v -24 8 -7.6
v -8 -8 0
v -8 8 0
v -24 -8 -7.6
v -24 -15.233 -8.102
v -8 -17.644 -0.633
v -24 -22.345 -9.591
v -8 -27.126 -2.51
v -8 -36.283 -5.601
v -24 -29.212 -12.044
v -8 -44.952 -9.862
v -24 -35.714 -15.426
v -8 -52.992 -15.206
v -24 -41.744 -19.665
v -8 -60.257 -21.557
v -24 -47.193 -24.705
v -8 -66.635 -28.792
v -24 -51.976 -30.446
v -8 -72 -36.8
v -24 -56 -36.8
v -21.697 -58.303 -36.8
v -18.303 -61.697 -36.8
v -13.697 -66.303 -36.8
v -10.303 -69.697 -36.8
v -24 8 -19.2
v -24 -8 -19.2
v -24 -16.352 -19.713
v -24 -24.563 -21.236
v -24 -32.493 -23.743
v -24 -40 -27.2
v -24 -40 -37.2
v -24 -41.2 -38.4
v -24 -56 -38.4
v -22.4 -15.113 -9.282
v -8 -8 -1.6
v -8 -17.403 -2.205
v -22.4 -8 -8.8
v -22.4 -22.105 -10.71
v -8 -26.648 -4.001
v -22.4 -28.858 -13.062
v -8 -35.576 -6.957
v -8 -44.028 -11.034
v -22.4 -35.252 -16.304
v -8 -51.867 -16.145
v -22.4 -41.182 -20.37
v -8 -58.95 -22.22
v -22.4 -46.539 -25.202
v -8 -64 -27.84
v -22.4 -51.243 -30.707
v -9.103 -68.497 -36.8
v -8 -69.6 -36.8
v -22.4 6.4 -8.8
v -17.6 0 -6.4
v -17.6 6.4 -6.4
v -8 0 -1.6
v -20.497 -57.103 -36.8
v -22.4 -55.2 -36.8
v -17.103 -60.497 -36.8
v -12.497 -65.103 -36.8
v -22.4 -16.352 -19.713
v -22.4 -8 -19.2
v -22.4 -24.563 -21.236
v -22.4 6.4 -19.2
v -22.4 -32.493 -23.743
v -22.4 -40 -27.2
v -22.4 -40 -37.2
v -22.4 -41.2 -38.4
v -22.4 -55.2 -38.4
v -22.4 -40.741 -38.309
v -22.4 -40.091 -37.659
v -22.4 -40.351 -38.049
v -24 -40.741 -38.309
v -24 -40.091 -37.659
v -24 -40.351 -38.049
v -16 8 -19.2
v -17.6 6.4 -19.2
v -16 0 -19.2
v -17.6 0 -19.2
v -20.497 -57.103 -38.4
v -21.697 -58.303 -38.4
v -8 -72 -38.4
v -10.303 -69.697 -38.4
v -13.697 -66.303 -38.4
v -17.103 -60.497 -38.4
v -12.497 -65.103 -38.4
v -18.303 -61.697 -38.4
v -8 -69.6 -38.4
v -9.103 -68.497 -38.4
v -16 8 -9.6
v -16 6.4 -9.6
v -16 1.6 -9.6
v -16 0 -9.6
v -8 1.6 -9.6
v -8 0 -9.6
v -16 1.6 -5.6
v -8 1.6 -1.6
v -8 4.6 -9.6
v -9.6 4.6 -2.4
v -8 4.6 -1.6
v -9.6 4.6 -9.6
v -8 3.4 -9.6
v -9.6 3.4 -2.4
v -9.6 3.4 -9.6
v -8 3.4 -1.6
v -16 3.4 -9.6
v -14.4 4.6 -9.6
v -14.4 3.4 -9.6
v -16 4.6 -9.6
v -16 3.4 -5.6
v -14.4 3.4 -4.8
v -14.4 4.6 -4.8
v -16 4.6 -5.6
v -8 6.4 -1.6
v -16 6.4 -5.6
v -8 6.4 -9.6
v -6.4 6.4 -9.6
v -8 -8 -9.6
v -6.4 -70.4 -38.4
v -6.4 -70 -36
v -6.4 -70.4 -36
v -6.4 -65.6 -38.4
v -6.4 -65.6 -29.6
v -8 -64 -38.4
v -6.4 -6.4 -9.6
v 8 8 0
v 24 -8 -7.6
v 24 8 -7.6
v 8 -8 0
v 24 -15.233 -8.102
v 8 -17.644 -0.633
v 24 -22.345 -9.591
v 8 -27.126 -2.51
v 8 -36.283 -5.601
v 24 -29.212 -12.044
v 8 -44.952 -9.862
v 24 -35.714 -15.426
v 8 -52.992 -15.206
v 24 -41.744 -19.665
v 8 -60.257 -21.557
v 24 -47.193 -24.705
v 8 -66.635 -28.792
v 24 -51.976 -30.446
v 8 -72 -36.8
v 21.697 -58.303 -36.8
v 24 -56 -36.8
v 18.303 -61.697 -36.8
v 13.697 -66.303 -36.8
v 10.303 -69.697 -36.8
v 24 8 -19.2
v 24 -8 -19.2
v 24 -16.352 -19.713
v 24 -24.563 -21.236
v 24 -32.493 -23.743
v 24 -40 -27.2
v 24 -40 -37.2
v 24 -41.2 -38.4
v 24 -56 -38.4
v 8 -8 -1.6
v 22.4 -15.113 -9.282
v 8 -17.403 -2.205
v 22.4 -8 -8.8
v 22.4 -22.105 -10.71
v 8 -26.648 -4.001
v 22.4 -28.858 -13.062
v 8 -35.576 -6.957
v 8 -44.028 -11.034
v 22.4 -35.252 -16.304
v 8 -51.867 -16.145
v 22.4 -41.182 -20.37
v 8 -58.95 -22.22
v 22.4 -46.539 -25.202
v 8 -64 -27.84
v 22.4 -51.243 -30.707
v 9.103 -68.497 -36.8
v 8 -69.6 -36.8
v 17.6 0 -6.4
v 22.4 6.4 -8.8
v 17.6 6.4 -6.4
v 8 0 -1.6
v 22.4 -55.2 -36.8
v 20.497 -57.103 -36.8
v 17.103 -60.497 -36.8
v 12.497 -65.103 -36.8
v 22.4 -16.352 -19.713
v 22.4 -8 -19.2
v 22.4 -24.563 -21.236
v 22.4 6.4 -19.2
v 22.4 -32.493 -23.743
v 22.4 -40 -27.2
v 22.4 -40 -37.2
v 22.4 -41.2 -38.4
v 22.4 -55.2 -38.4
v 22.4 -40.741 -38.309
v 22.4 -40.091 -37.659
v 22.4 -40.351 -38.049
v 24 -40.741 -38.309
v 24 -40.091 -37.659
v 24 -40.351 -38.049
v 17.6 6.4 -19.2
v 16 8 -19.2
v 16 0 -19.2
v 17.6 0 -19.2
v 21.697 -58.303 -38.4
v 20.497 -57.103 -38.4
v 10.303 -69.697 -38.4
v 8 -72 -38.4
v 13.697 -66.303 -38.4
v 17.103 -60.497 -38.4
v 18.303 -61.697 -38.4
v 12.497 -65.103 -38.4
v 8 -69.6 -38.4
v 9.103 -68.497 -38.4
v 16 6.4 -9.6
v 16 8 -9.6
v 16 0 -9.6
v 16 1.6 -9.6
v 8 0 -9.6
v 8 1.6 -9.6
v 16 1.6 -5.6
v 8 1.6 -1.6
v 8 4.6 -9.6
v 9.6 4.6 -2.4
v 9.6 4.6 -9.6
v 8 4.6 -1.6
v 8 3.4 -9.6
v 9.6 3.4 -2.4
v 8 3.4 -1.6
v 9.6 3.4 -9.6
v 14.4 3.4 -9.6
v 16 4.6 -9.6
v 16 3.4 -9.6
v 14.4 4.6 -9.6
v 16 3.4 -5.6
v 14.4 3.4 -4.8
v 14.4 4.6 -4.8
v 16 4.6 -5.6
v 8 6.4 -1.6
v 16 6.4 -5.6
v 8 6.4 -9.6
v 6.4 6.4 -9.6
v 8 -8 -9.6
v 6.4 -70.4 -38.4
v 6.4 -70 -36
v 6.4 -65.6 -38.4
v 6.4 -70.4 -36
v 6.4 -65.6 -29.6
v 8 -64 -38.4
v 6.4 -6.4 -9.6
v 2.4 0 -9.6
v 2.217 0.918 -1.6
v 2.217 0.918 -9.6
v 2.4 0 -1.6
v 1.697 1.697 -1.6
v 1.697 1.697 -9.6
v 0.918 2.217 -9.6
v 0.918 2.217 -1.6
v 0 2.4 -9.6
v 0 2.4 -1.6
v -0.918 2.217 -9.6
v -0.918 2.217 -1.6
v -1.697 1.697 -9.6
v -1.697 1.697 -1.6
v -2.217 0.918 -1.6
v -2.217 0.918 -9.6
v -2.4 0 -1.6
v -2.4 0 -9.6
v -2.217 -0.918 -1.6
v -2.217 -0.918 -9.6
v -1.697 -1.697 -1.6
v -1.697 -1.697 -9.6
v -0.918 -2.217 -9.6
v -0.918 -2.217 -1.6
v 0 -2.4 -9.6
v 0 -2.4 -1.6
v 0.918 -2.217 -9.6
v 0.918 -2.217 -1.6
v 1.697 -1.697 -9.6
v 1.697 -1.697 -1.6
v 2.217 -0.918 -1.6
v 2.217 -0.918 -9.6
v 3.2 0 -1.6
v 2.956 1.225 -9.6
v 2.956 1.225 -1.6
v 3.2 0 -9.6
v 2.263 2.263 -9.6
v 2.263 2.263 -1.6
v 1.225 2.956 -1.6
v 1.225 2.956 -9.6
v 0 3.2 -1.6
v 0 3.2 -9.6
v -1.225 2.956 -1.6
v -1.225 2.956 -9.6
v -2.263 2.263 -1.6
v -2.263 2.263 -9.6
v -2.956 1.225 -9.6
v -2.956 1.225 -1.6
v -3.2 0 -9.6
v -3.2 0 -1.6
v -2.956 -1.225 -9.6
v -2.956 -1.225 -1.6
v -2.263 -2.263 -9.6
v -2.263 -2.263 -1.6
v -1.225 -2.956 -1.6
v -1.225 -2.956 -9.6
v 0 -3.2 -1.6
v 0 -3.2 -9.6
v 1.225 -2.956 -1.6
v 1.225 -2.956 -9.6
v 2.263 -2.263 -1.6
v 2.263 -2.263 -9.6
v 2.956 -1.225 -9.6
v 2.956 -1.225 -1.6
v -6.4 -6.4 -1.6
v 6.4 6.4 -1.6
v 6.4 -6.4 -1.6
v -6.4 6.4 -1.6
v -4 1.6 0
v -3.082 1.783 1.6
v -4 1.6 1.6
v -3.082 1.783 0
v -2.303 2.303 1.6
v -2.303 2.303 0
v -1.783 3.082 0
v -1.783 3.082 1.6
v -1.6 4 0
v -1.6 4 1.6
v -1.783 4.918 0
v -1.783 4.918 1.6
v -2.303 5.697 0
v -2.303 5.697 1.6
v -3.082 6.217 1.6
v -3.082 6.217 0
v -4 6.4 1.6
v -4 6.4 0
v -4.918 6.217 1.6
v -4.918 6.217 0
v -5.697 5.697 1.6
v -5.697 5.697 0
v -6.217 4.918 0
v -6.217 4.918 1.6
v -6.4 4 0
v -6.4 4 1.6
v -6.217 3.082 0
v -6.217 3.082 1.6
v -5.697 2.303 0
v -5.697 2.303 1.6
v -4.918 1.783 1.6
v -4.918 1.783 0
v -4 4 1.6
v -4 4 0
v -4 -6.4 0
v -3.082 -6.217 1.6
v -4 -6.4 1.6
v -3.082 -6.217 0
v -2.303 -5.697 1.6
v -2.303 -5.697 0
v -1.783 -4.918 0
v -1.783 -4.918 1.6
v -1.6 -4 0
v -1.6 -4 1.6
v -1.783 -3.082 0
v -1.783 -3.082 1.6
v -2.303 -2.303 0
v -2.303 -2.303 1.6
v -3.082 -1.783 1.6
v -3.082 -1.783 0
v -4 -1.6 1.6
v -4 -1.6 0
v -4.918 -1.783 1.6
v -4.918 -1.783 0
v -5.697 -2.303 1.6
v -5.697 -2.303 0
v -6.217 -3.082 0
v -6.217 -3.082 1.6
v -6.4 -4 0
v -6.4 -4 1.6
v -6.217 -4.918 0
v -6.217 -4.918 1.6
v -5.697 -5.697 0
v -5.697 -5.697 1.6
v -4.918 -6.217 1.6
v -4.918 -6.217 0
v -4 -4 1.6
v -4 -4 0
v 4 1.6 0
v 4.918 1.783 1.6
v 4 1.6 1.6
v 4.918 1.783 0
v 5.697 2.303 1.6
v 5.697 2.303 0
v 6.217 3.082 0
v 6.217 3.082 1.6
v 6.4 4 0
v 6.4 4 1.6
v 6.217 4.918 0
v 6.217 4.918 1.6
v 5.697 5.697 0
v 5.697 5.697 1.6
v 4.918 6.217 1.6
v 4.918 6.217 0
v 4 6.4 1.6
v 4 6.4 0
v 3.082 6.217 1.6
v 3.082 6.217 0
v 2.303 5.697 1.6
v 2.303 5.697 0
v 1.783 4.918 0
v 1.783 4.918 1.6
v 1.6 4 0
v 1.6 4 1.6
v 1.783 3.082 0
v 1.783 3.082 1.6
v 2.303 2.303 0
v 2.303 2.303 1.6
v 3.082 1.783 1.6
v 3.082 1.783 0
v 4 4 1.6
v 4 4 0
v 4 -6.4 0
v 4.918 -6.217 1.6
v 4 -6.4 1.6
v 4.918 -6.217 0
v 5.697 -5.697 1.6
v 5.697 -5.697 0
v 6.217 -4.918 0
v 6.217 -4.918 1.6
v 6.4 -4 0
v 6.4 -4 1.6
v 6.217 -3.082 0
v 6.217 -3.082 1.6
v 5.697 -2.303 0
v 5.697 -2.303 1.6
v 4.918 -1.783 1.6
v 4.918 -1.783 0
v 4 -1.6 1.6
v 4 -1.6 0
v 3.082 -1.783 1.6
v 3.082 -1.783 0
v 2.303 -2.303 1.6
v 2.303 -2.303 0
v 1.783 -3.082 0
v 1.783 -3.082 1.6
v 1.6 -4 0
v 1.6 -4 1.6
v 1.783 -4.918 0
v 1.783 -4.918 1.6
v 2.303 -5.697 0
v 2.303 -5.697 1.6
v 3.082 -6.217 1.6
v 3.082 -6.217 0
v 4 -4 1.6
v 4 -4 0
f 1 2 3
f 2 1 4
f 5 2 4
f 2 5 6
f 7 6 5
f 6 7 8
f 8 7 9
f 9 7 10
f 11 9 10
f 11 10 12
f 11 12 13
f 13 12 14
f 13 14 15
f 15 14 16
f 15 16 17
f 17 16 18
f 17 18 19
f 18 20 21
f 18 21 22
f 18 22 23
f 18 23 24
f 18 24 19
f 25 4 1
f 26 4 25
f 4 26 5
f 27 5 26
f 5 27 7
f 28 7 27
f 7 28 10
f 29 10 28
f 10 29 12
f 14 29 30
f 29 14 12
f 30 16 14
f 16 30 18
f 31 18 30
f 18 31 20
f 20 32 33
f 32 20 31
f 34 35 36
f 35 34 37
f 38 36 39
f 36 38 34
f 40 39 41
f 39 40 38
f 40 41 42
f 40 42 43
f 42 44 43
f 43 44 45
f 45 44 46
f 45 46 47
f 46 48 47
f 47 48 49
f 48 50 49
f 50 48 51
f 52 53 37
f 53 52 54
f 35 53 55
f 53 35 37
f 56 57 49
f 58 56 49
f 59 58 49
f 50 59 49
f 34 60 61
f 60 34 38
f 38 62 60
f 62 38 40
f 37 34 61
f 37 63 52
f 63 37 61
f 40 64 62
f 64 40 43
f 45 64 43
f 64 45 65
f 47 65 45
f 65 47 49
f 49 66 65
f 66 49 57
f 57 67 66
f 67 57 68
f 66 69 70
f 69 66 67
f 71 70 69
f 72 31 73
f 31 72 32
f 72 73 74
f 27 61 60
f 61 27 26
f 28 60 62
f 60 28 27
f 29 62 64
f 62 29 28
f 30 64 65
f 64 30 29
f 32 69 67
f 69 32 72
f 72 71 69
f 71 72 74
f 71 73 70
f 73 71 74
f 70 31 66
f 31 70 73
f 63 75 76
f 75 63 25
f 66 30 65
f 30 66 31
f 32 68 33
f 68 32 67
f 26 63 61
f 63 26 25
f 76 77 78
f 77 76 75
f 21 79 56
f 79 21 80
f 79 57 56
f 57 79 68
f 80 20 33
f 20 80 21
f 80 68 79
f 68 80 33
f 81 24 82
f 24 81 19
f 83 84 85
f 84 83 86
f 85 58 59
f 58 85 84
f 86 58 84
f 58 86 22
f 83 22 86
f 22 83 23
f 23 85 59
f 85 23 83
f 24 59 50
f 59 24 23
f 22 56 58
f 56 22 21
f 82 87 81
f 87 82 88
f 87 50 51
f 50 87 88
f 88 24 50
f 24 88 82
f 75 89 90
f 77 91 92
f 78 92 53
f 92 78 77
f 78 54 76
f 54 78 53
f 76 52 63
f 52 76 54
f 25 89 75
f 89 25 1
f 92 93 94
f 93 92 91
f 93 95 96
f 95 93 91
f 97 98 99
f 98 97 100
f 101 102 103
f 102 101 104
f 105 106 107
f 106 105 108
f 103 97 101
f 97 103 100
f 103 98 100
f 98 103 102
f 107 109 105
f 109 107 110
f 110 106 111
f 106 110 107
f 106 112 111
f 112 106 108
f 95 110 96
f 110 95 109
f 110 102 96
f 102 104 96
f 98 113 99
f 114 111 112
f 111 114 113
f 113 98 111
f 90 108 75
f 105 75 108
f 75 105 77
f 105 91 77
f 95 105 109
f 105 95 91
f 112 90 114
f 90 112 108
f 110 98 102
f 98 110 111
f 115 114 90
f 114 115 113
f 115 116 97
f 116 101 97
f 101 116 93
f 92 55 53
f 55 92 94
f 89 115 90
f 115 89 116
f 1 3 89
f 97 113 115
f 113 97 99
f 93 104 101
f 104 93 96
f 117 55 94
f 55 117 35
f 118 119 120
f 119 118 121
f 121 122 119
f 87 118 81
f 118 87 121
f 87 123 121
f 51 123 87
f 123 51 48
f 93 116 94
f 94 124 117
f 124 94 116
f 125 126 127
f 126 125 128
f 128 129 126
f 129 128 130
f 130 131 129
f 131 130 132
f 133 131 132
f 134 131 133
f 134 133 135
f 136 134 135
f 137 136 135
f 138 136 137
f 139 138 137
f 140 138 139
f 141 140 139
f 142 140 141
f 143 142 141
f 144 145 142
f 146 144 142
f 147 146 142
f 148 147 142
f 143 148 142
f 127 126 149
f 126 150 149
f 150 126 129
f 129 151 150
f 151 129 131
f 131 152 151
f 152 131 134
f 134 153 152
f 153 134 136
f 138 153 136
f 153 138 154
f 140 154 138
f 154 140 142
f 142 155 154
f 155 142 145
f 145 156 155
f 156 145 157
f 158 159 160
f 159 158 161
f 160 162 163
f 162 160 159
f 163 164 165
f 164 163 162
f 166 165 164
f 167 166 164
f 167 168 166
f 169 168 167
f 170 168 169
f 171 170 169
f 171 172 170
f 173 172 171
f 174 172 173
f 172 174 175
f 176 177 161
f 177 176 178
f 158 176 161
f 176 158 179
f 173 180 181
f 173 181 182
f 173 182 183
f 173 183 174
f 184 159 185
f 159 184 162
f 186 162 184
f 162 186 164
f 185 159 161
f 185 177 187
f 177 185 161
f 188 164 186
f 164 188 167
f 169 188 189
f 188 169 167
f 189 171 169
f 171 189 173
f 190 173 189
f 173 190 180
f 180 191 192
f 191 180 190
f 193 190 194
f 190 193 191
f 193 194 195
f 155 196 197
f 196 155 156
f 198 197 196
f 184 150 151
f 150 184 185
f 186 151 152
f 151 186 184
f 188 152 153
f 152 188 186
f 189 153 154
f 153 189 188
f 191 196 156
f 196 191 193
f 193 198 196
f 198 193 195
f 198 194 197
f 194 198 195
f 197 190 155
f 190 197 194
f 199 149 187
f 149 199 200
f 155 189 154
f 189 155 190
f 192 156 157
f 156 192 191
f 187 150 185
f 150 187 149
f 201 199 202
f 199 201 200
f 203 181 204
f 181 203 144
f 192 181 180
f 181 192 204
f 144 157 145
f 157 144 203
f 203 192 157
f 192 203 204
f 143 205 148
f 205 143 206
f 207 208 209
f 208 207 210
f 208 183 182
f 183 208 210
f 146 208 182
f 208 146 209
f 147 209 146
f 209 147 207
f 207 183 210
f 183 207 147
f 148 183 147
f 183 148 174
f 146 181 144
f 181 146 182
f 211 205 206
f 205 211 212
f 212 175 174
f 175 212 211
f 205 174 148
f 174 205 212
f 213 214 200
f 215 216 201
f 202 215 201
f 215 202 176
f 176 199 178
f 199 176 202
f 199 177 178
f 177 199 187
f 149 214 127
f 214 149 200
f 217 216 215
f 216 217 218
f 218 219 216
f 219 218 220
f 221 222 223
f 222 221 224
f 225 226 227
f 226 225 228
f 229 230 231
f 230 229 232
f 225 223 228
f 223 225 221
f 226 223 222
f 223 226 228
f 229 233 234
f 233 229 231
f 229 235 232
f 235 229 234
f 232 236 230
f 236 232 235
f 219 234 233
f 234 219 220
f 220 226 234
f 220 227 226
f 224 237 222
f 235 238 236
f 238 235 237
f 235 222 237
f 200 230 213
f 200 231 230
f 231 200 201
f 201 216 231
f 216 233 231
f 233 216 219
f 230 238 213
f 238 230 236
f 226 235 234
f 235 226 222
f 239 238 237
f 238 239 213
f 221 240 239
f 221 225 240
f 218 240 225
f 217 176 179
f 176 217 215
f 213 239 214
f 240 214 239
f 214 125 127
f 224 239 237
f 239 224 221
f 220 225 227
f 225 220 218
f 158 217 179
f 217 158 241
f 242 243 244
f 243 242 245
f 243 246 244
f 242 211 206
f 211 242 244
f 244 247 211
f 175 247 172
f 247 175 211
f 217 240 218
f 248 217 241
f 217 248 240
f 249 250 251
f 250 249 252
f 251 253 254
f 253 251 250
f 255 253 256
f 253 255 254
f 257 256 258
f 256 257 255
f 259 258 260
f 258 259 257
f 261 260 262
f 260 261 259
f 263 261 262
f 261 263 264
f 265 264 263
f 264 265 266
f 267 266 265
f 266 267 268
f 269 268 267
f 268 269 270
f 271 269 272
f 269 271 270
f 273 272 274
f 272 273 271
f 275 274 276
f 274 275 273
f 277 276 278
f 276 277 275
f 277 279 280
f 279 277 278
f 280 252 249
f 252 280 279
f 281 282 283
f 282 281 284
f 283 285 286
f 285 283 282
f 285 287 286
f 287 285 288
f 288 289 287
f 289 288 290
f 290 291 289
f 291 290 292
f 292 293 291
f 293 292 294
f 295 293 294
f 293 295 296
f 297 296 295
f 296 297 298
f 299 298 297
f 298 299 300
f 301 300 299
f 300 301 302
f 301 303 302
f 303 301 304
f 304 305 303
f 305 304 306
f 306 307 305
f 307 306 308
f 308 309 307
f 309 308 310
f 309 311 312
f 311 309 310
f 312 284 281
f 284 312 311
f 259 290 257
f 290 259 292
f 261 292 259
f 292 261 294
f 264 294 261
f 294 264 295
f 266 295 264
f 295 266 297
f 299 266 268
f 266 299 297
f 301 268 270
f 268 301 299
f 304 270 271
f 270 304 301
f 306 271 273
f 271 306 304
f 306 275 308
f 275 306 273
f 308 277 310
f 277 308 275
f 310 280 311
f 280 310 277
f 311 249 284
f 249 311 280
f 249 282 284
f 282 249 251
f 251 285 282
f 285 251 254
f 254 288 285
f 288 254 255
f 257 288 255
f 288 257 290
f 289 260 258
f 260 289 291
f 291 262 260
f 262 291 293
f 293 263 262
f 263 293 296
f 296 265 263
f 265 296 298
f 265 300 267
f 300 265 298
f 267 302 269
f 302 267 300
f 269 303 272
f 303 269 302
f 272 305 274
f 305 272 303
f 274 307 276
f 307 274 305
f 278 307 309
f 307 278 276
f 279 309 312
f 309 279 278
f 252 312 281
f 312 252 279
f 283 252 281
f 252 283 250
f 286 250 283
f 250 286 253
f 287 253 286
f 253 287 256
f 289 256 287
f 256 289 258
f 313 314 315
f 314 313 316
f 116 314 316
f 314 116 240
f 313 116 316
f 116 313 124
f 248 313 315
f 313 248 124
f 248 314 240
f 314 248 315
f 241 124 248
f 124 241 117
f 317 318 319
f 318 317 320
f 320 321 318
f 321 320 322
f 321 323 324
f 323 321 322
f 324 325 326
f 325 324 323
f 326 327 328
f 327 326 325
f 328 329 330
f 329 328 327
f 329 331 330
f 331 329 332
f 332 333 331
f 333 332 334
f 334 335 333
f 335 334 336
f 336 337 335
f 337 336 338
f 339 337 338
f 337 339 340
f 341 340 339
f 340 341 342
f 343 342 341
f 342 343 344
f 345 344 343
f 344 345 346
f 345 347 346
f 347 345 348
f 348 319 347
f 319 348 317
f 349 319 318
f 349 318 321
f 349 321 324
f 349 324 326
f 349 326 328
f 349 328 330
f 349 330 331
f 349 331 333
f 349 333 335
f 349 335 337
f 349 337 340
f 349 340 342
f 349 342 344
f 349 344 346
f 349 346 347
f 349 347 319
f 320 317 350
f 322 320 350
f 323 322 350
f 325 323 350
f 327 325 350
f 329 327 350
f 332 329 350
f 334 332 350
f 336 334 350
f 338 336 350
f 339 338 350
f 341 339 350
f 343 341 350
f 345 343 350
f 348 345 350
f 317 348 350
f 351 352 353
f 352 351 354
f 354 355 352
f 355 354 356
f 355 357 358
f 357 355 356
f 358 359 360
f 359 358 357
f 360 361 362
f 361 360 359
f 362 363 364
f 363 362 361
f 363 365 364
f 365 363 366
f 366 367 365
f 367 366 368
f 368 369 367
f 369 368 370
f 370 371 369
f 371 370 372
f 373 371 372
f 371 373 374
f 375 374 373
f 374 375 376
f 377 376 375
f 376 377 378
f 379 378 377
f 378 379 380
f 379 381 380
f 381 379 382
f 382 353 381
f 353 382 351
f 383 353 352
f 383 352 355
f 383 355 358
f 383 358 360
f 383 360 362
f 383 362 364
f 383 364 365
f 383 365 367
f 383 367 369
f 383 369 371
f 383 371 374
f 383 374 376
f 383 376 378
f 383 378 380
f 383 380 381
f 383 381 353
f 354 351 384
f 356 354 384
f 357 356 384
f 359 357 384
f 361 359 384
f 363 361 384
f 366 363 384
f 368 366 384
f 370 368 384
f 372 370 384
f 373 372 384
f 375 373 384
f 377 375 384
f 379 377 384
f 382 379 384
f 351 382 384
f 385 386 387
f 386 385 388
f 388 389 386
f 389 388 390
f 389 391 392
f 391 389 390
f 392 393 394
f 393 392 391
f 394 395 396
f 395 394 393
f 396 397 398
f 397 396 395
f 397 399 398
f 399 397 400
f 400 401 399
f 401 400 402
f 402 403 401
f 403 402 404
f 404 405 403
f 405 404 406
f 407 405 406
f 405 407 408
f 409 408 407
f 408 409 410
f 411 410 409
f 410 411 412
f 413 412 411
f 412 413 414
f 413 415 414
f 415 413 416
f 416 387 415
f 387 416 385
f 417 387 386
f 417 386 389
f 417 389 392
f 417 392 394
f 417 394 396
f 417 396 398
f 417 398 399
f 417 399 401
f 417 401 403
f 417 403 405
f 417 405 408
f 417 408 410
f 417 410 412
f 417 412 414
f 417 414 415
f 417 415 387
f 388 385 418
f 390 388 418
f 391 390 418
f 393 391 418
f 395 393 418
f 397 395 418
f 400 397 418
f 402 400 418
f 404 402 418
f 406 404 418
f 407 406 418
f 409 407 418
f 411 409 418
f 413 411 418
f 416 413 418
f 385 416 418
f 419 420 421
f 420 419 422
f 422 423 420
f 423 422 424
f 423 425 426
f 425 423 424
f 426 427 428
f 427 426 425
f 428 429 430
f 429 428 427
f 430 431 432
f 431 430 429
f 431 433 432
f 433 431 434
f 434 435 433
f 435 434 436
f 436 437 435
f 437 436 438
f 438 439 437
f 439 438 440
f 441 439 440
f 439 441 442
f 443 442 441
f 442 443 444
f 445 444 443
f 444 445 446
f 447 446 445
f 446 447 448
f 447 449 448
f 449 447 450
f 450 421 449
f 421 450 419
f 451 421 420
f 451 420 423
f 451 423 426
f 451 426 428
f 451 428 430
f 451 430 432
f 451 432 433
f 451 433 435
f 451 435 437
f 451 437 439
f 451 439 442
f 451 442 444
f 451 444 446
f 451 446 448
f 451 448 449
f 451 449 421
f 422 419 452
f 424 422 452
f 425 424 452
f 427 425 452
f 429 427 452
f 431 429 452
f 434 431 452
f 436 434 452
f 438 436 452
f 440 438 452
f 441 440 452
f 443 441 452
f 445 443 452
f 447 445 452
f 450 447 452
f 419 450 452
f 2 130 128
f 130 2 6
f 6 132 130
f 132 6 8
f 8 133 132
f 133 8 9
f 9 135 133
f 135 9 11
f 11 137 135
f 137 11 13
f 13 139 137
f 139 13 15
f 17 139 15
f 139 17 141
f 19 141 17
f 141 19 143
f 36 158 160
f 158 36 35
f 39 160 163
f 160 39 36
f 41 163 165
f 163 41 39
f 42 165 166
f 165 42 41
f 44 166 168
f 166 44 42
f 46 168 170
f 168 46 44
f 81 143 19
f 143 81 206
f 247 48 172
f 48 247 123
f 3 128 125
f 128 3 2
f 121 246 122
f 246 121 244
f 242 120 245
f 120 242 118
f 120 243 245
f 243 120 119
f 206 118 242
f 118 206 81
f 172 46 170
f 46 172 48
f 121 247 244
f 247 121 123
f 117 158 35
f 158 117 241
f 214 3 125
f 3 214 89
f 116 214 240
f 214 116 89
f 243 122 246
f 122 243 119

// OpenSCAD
use <../lib.scad>
use <../p/48/1-6cyli.scad>
use <../p/48/1-8cyli.scad>
use <../p/box5.scad>
use <../p/rect1.scad>
use <../p/rect2p.scad>
use <s/18729s01.scad>
use <../p/stud4.scad>
use <../p/stug-2x2.scad>
function ldraw_lib__18729() = [
// 0 Windscreen  6 x 10 x  4 Curved
// 0 Name: 18729.dat
// 0 Author: Evert-Jan Boer [ejboer]
// 0 !LDRAW_ORG Part UPDATE 2023-04
// 0 !LICENSE Licensed under CC BY 4.0 : see CAreadme.txt
// 
// 0 BFC CERTIFY CCW
  [0,"BFC","CERTIFY"],
  [0,"BFC","CCW"],
// 
// 0 !HISTORY 2016-03-18 {LEGO Digital Designer} Original part shape
// 0 !HISTORY 2021-02-20 [ejboer] File preparation for LDraw Parts Tracker
// 0 !HISTORY 2023-08-25 [OrionP] Official Update 2023-04
// 
// 
// 1 16 0 0 0 1 0 0 0 1 0 0 0 1 s\18729s01.dat
  [1,16,0,0,0,1,0,0,0,1,0,0,0,1, ldraw_lib__s__18729s01()],
// 1 16 0 0 0 -1 0 0 0 1 0 0 0 1 s\18729s01.dat
  [1,16,0,0,0,-1,0,0,0,1,0,0,0,1, ldraw_lib__s__18729s01()],
// 
// 1 16 0 4 0 1 0 0 0 -5 0 0 0 1 stud4.dat
  [1,16,0,4,0,1,0,0,0,-5,0,0,0,1, ldraw_lib__stud4()],
// 0 BFC INVERTNEXT
  [0,"BFC","INVERTNEXT"],
// 1 16 0 24 0 16 0 0 0 -20 0 0 0 16 box5.dat
  [1,16,0,24,0,16,0,0,0,-20,0,0,0,16, ldraw_lib__box5()],
// 4 16 -20 24 -20 -16 24 -16 16 24 -16 20 24 -20
  [4,16,-20,24,-20,-16,24,-16,16,24,-16,20,24,-20],
// 
// 1 16 0 0 0 0 0 1 0 1 0 -1 0 0 stug-2x2.dat
  [1,16,0,0,0,0,0,1,0,1,0,-1,0,0, ldraw_lib__stug_2x2()],
// 
// 1 16 20 184 -20 0 -40 0 -184 0 0 0 0 -184.75751 48\1-6cyli.dat
  [1,16,20,184,-20,0,-40,0,-184,0,0,0,0,-184.75751, ldraw_lib__48__1_6cyli()],
// 0 BFC INVERTNEXT
  [0,"BFC","INVERTNEXT"],
// 1 16 20 180 -20 0 -40 0 -176 0 0 0 0 -180.13857 48\1-8cyli.dat
  [1,16,20,180,-20,0,-40,0,-176,0,0,0,0,-180.13857, ldraw_lib__48__1_8cyli()],
// 1 16 0 94 -180 0 0 20 2 0 0 0 1 0 rect1.dat
  [1,16,0,94,-180,0,0,20,2,0,0,0,1,0, ldraw_lib__rect1()],
// 1 16 0 82.7997 -160 20 0 0 0 0 13.2003 0 -1 0 rect2p.dat
  [1,16,0,82.7997,-160,20,0,0,0,0,13.2003,0,-1,0, ldraw_lib__rect2p()],
// 1 16 0 0 0 0 0 -20 0 1 0 20 0 0 rect1.dat
  [1,16,0,0,0,0,0,-20,0,1,0,20,0,0, ldraw_lib__rect1()],
// 1 16 0 85 -164 16 0 0 0 0 -11 0 1 0 rect2p.dat
  [1,16,0,85,-164,16,0,0,0,0,-11,0,1,0, ldraw_lib__rect2p()],
// 1 16 0 93 -176 -16 0 0 0 0 -3 0 -1 0 rect2p.dat
  [1,16,0,93,-176,-16,0,0,0,0,-3,0,-1,0, ldraw_lib__rect2p()],
// 1 16 0 90 -175.5 0 0 16 0 -1 0 0.5 0 0 rect1.dat
  [1,16,0,90,-175.5,0,0,16,0,-1,0,0.5,0,0, ldraw_lib__rect1()],
// 4 16 16 96 -176 20 96 -180 -20 96 -180 -16 96 -176
  [4,16,16,96,-176,20,96,-180,-20,96,-180,-16,96,-176],
// 4 16 -20 69.5994 -160 -20 55.5504 -147.376 20 55.5504 -147.376 20 69.5994 -160
  [4,16,-20,69.5994,-160,-20,55.5504,-147.376,20,55.5504,-147.376,20,69.5994,-160],
// 4 16 -20 96 -160 20 96 -160 16 96 -164 -16 96 -164
  [4,16,-20,96,-160,20,96,-160,16,96,-164,-16,96,-164],
// 1 16 0 14 -20 20 0 0 0 0 -10 0 1 0 rect2p.dat
  [1,16,0,14,-20,20,0,0,0,0,-10,0,1,0, ldraw_lib__rect2p()],
// 4 16 -20 0 20 20 0 20 40 24 20 -40 24 20
  [4,16,-20,0,20,20,0,20,40,24,20,-40,24,20],
// 4 16 40 24 20 16 24 16 -16 24 16 -40 24 20
  [4,16,40,24,20,16,24,16,-16,24,16,-40,24,20],
// 4 16 16 74 -164 16 90 -175 -16 90 -175 -16 74 -164
  [4,16,16,74,-164,16,90,-175,-16,90,-175,-16,74,-164],
// 
// 2 24 40 24 20 -40 24 20
  [2,24,40,24,20,-40,24,20],
// 2 24 20 92 -180 -20 92 -180
  [2,24,20,92,-180,-20,92,-180],
];
module ldraw_lib__18729(step=0, col=false, unit=2/5, alt=false, line=0.2, solid=!$preview)
    makepoly(ldraw_lib__18729(), step=step, col=col, unit=unit, alt=alt, line=line, solid=solid);
ldraw_lib__18729(line=0.2);
